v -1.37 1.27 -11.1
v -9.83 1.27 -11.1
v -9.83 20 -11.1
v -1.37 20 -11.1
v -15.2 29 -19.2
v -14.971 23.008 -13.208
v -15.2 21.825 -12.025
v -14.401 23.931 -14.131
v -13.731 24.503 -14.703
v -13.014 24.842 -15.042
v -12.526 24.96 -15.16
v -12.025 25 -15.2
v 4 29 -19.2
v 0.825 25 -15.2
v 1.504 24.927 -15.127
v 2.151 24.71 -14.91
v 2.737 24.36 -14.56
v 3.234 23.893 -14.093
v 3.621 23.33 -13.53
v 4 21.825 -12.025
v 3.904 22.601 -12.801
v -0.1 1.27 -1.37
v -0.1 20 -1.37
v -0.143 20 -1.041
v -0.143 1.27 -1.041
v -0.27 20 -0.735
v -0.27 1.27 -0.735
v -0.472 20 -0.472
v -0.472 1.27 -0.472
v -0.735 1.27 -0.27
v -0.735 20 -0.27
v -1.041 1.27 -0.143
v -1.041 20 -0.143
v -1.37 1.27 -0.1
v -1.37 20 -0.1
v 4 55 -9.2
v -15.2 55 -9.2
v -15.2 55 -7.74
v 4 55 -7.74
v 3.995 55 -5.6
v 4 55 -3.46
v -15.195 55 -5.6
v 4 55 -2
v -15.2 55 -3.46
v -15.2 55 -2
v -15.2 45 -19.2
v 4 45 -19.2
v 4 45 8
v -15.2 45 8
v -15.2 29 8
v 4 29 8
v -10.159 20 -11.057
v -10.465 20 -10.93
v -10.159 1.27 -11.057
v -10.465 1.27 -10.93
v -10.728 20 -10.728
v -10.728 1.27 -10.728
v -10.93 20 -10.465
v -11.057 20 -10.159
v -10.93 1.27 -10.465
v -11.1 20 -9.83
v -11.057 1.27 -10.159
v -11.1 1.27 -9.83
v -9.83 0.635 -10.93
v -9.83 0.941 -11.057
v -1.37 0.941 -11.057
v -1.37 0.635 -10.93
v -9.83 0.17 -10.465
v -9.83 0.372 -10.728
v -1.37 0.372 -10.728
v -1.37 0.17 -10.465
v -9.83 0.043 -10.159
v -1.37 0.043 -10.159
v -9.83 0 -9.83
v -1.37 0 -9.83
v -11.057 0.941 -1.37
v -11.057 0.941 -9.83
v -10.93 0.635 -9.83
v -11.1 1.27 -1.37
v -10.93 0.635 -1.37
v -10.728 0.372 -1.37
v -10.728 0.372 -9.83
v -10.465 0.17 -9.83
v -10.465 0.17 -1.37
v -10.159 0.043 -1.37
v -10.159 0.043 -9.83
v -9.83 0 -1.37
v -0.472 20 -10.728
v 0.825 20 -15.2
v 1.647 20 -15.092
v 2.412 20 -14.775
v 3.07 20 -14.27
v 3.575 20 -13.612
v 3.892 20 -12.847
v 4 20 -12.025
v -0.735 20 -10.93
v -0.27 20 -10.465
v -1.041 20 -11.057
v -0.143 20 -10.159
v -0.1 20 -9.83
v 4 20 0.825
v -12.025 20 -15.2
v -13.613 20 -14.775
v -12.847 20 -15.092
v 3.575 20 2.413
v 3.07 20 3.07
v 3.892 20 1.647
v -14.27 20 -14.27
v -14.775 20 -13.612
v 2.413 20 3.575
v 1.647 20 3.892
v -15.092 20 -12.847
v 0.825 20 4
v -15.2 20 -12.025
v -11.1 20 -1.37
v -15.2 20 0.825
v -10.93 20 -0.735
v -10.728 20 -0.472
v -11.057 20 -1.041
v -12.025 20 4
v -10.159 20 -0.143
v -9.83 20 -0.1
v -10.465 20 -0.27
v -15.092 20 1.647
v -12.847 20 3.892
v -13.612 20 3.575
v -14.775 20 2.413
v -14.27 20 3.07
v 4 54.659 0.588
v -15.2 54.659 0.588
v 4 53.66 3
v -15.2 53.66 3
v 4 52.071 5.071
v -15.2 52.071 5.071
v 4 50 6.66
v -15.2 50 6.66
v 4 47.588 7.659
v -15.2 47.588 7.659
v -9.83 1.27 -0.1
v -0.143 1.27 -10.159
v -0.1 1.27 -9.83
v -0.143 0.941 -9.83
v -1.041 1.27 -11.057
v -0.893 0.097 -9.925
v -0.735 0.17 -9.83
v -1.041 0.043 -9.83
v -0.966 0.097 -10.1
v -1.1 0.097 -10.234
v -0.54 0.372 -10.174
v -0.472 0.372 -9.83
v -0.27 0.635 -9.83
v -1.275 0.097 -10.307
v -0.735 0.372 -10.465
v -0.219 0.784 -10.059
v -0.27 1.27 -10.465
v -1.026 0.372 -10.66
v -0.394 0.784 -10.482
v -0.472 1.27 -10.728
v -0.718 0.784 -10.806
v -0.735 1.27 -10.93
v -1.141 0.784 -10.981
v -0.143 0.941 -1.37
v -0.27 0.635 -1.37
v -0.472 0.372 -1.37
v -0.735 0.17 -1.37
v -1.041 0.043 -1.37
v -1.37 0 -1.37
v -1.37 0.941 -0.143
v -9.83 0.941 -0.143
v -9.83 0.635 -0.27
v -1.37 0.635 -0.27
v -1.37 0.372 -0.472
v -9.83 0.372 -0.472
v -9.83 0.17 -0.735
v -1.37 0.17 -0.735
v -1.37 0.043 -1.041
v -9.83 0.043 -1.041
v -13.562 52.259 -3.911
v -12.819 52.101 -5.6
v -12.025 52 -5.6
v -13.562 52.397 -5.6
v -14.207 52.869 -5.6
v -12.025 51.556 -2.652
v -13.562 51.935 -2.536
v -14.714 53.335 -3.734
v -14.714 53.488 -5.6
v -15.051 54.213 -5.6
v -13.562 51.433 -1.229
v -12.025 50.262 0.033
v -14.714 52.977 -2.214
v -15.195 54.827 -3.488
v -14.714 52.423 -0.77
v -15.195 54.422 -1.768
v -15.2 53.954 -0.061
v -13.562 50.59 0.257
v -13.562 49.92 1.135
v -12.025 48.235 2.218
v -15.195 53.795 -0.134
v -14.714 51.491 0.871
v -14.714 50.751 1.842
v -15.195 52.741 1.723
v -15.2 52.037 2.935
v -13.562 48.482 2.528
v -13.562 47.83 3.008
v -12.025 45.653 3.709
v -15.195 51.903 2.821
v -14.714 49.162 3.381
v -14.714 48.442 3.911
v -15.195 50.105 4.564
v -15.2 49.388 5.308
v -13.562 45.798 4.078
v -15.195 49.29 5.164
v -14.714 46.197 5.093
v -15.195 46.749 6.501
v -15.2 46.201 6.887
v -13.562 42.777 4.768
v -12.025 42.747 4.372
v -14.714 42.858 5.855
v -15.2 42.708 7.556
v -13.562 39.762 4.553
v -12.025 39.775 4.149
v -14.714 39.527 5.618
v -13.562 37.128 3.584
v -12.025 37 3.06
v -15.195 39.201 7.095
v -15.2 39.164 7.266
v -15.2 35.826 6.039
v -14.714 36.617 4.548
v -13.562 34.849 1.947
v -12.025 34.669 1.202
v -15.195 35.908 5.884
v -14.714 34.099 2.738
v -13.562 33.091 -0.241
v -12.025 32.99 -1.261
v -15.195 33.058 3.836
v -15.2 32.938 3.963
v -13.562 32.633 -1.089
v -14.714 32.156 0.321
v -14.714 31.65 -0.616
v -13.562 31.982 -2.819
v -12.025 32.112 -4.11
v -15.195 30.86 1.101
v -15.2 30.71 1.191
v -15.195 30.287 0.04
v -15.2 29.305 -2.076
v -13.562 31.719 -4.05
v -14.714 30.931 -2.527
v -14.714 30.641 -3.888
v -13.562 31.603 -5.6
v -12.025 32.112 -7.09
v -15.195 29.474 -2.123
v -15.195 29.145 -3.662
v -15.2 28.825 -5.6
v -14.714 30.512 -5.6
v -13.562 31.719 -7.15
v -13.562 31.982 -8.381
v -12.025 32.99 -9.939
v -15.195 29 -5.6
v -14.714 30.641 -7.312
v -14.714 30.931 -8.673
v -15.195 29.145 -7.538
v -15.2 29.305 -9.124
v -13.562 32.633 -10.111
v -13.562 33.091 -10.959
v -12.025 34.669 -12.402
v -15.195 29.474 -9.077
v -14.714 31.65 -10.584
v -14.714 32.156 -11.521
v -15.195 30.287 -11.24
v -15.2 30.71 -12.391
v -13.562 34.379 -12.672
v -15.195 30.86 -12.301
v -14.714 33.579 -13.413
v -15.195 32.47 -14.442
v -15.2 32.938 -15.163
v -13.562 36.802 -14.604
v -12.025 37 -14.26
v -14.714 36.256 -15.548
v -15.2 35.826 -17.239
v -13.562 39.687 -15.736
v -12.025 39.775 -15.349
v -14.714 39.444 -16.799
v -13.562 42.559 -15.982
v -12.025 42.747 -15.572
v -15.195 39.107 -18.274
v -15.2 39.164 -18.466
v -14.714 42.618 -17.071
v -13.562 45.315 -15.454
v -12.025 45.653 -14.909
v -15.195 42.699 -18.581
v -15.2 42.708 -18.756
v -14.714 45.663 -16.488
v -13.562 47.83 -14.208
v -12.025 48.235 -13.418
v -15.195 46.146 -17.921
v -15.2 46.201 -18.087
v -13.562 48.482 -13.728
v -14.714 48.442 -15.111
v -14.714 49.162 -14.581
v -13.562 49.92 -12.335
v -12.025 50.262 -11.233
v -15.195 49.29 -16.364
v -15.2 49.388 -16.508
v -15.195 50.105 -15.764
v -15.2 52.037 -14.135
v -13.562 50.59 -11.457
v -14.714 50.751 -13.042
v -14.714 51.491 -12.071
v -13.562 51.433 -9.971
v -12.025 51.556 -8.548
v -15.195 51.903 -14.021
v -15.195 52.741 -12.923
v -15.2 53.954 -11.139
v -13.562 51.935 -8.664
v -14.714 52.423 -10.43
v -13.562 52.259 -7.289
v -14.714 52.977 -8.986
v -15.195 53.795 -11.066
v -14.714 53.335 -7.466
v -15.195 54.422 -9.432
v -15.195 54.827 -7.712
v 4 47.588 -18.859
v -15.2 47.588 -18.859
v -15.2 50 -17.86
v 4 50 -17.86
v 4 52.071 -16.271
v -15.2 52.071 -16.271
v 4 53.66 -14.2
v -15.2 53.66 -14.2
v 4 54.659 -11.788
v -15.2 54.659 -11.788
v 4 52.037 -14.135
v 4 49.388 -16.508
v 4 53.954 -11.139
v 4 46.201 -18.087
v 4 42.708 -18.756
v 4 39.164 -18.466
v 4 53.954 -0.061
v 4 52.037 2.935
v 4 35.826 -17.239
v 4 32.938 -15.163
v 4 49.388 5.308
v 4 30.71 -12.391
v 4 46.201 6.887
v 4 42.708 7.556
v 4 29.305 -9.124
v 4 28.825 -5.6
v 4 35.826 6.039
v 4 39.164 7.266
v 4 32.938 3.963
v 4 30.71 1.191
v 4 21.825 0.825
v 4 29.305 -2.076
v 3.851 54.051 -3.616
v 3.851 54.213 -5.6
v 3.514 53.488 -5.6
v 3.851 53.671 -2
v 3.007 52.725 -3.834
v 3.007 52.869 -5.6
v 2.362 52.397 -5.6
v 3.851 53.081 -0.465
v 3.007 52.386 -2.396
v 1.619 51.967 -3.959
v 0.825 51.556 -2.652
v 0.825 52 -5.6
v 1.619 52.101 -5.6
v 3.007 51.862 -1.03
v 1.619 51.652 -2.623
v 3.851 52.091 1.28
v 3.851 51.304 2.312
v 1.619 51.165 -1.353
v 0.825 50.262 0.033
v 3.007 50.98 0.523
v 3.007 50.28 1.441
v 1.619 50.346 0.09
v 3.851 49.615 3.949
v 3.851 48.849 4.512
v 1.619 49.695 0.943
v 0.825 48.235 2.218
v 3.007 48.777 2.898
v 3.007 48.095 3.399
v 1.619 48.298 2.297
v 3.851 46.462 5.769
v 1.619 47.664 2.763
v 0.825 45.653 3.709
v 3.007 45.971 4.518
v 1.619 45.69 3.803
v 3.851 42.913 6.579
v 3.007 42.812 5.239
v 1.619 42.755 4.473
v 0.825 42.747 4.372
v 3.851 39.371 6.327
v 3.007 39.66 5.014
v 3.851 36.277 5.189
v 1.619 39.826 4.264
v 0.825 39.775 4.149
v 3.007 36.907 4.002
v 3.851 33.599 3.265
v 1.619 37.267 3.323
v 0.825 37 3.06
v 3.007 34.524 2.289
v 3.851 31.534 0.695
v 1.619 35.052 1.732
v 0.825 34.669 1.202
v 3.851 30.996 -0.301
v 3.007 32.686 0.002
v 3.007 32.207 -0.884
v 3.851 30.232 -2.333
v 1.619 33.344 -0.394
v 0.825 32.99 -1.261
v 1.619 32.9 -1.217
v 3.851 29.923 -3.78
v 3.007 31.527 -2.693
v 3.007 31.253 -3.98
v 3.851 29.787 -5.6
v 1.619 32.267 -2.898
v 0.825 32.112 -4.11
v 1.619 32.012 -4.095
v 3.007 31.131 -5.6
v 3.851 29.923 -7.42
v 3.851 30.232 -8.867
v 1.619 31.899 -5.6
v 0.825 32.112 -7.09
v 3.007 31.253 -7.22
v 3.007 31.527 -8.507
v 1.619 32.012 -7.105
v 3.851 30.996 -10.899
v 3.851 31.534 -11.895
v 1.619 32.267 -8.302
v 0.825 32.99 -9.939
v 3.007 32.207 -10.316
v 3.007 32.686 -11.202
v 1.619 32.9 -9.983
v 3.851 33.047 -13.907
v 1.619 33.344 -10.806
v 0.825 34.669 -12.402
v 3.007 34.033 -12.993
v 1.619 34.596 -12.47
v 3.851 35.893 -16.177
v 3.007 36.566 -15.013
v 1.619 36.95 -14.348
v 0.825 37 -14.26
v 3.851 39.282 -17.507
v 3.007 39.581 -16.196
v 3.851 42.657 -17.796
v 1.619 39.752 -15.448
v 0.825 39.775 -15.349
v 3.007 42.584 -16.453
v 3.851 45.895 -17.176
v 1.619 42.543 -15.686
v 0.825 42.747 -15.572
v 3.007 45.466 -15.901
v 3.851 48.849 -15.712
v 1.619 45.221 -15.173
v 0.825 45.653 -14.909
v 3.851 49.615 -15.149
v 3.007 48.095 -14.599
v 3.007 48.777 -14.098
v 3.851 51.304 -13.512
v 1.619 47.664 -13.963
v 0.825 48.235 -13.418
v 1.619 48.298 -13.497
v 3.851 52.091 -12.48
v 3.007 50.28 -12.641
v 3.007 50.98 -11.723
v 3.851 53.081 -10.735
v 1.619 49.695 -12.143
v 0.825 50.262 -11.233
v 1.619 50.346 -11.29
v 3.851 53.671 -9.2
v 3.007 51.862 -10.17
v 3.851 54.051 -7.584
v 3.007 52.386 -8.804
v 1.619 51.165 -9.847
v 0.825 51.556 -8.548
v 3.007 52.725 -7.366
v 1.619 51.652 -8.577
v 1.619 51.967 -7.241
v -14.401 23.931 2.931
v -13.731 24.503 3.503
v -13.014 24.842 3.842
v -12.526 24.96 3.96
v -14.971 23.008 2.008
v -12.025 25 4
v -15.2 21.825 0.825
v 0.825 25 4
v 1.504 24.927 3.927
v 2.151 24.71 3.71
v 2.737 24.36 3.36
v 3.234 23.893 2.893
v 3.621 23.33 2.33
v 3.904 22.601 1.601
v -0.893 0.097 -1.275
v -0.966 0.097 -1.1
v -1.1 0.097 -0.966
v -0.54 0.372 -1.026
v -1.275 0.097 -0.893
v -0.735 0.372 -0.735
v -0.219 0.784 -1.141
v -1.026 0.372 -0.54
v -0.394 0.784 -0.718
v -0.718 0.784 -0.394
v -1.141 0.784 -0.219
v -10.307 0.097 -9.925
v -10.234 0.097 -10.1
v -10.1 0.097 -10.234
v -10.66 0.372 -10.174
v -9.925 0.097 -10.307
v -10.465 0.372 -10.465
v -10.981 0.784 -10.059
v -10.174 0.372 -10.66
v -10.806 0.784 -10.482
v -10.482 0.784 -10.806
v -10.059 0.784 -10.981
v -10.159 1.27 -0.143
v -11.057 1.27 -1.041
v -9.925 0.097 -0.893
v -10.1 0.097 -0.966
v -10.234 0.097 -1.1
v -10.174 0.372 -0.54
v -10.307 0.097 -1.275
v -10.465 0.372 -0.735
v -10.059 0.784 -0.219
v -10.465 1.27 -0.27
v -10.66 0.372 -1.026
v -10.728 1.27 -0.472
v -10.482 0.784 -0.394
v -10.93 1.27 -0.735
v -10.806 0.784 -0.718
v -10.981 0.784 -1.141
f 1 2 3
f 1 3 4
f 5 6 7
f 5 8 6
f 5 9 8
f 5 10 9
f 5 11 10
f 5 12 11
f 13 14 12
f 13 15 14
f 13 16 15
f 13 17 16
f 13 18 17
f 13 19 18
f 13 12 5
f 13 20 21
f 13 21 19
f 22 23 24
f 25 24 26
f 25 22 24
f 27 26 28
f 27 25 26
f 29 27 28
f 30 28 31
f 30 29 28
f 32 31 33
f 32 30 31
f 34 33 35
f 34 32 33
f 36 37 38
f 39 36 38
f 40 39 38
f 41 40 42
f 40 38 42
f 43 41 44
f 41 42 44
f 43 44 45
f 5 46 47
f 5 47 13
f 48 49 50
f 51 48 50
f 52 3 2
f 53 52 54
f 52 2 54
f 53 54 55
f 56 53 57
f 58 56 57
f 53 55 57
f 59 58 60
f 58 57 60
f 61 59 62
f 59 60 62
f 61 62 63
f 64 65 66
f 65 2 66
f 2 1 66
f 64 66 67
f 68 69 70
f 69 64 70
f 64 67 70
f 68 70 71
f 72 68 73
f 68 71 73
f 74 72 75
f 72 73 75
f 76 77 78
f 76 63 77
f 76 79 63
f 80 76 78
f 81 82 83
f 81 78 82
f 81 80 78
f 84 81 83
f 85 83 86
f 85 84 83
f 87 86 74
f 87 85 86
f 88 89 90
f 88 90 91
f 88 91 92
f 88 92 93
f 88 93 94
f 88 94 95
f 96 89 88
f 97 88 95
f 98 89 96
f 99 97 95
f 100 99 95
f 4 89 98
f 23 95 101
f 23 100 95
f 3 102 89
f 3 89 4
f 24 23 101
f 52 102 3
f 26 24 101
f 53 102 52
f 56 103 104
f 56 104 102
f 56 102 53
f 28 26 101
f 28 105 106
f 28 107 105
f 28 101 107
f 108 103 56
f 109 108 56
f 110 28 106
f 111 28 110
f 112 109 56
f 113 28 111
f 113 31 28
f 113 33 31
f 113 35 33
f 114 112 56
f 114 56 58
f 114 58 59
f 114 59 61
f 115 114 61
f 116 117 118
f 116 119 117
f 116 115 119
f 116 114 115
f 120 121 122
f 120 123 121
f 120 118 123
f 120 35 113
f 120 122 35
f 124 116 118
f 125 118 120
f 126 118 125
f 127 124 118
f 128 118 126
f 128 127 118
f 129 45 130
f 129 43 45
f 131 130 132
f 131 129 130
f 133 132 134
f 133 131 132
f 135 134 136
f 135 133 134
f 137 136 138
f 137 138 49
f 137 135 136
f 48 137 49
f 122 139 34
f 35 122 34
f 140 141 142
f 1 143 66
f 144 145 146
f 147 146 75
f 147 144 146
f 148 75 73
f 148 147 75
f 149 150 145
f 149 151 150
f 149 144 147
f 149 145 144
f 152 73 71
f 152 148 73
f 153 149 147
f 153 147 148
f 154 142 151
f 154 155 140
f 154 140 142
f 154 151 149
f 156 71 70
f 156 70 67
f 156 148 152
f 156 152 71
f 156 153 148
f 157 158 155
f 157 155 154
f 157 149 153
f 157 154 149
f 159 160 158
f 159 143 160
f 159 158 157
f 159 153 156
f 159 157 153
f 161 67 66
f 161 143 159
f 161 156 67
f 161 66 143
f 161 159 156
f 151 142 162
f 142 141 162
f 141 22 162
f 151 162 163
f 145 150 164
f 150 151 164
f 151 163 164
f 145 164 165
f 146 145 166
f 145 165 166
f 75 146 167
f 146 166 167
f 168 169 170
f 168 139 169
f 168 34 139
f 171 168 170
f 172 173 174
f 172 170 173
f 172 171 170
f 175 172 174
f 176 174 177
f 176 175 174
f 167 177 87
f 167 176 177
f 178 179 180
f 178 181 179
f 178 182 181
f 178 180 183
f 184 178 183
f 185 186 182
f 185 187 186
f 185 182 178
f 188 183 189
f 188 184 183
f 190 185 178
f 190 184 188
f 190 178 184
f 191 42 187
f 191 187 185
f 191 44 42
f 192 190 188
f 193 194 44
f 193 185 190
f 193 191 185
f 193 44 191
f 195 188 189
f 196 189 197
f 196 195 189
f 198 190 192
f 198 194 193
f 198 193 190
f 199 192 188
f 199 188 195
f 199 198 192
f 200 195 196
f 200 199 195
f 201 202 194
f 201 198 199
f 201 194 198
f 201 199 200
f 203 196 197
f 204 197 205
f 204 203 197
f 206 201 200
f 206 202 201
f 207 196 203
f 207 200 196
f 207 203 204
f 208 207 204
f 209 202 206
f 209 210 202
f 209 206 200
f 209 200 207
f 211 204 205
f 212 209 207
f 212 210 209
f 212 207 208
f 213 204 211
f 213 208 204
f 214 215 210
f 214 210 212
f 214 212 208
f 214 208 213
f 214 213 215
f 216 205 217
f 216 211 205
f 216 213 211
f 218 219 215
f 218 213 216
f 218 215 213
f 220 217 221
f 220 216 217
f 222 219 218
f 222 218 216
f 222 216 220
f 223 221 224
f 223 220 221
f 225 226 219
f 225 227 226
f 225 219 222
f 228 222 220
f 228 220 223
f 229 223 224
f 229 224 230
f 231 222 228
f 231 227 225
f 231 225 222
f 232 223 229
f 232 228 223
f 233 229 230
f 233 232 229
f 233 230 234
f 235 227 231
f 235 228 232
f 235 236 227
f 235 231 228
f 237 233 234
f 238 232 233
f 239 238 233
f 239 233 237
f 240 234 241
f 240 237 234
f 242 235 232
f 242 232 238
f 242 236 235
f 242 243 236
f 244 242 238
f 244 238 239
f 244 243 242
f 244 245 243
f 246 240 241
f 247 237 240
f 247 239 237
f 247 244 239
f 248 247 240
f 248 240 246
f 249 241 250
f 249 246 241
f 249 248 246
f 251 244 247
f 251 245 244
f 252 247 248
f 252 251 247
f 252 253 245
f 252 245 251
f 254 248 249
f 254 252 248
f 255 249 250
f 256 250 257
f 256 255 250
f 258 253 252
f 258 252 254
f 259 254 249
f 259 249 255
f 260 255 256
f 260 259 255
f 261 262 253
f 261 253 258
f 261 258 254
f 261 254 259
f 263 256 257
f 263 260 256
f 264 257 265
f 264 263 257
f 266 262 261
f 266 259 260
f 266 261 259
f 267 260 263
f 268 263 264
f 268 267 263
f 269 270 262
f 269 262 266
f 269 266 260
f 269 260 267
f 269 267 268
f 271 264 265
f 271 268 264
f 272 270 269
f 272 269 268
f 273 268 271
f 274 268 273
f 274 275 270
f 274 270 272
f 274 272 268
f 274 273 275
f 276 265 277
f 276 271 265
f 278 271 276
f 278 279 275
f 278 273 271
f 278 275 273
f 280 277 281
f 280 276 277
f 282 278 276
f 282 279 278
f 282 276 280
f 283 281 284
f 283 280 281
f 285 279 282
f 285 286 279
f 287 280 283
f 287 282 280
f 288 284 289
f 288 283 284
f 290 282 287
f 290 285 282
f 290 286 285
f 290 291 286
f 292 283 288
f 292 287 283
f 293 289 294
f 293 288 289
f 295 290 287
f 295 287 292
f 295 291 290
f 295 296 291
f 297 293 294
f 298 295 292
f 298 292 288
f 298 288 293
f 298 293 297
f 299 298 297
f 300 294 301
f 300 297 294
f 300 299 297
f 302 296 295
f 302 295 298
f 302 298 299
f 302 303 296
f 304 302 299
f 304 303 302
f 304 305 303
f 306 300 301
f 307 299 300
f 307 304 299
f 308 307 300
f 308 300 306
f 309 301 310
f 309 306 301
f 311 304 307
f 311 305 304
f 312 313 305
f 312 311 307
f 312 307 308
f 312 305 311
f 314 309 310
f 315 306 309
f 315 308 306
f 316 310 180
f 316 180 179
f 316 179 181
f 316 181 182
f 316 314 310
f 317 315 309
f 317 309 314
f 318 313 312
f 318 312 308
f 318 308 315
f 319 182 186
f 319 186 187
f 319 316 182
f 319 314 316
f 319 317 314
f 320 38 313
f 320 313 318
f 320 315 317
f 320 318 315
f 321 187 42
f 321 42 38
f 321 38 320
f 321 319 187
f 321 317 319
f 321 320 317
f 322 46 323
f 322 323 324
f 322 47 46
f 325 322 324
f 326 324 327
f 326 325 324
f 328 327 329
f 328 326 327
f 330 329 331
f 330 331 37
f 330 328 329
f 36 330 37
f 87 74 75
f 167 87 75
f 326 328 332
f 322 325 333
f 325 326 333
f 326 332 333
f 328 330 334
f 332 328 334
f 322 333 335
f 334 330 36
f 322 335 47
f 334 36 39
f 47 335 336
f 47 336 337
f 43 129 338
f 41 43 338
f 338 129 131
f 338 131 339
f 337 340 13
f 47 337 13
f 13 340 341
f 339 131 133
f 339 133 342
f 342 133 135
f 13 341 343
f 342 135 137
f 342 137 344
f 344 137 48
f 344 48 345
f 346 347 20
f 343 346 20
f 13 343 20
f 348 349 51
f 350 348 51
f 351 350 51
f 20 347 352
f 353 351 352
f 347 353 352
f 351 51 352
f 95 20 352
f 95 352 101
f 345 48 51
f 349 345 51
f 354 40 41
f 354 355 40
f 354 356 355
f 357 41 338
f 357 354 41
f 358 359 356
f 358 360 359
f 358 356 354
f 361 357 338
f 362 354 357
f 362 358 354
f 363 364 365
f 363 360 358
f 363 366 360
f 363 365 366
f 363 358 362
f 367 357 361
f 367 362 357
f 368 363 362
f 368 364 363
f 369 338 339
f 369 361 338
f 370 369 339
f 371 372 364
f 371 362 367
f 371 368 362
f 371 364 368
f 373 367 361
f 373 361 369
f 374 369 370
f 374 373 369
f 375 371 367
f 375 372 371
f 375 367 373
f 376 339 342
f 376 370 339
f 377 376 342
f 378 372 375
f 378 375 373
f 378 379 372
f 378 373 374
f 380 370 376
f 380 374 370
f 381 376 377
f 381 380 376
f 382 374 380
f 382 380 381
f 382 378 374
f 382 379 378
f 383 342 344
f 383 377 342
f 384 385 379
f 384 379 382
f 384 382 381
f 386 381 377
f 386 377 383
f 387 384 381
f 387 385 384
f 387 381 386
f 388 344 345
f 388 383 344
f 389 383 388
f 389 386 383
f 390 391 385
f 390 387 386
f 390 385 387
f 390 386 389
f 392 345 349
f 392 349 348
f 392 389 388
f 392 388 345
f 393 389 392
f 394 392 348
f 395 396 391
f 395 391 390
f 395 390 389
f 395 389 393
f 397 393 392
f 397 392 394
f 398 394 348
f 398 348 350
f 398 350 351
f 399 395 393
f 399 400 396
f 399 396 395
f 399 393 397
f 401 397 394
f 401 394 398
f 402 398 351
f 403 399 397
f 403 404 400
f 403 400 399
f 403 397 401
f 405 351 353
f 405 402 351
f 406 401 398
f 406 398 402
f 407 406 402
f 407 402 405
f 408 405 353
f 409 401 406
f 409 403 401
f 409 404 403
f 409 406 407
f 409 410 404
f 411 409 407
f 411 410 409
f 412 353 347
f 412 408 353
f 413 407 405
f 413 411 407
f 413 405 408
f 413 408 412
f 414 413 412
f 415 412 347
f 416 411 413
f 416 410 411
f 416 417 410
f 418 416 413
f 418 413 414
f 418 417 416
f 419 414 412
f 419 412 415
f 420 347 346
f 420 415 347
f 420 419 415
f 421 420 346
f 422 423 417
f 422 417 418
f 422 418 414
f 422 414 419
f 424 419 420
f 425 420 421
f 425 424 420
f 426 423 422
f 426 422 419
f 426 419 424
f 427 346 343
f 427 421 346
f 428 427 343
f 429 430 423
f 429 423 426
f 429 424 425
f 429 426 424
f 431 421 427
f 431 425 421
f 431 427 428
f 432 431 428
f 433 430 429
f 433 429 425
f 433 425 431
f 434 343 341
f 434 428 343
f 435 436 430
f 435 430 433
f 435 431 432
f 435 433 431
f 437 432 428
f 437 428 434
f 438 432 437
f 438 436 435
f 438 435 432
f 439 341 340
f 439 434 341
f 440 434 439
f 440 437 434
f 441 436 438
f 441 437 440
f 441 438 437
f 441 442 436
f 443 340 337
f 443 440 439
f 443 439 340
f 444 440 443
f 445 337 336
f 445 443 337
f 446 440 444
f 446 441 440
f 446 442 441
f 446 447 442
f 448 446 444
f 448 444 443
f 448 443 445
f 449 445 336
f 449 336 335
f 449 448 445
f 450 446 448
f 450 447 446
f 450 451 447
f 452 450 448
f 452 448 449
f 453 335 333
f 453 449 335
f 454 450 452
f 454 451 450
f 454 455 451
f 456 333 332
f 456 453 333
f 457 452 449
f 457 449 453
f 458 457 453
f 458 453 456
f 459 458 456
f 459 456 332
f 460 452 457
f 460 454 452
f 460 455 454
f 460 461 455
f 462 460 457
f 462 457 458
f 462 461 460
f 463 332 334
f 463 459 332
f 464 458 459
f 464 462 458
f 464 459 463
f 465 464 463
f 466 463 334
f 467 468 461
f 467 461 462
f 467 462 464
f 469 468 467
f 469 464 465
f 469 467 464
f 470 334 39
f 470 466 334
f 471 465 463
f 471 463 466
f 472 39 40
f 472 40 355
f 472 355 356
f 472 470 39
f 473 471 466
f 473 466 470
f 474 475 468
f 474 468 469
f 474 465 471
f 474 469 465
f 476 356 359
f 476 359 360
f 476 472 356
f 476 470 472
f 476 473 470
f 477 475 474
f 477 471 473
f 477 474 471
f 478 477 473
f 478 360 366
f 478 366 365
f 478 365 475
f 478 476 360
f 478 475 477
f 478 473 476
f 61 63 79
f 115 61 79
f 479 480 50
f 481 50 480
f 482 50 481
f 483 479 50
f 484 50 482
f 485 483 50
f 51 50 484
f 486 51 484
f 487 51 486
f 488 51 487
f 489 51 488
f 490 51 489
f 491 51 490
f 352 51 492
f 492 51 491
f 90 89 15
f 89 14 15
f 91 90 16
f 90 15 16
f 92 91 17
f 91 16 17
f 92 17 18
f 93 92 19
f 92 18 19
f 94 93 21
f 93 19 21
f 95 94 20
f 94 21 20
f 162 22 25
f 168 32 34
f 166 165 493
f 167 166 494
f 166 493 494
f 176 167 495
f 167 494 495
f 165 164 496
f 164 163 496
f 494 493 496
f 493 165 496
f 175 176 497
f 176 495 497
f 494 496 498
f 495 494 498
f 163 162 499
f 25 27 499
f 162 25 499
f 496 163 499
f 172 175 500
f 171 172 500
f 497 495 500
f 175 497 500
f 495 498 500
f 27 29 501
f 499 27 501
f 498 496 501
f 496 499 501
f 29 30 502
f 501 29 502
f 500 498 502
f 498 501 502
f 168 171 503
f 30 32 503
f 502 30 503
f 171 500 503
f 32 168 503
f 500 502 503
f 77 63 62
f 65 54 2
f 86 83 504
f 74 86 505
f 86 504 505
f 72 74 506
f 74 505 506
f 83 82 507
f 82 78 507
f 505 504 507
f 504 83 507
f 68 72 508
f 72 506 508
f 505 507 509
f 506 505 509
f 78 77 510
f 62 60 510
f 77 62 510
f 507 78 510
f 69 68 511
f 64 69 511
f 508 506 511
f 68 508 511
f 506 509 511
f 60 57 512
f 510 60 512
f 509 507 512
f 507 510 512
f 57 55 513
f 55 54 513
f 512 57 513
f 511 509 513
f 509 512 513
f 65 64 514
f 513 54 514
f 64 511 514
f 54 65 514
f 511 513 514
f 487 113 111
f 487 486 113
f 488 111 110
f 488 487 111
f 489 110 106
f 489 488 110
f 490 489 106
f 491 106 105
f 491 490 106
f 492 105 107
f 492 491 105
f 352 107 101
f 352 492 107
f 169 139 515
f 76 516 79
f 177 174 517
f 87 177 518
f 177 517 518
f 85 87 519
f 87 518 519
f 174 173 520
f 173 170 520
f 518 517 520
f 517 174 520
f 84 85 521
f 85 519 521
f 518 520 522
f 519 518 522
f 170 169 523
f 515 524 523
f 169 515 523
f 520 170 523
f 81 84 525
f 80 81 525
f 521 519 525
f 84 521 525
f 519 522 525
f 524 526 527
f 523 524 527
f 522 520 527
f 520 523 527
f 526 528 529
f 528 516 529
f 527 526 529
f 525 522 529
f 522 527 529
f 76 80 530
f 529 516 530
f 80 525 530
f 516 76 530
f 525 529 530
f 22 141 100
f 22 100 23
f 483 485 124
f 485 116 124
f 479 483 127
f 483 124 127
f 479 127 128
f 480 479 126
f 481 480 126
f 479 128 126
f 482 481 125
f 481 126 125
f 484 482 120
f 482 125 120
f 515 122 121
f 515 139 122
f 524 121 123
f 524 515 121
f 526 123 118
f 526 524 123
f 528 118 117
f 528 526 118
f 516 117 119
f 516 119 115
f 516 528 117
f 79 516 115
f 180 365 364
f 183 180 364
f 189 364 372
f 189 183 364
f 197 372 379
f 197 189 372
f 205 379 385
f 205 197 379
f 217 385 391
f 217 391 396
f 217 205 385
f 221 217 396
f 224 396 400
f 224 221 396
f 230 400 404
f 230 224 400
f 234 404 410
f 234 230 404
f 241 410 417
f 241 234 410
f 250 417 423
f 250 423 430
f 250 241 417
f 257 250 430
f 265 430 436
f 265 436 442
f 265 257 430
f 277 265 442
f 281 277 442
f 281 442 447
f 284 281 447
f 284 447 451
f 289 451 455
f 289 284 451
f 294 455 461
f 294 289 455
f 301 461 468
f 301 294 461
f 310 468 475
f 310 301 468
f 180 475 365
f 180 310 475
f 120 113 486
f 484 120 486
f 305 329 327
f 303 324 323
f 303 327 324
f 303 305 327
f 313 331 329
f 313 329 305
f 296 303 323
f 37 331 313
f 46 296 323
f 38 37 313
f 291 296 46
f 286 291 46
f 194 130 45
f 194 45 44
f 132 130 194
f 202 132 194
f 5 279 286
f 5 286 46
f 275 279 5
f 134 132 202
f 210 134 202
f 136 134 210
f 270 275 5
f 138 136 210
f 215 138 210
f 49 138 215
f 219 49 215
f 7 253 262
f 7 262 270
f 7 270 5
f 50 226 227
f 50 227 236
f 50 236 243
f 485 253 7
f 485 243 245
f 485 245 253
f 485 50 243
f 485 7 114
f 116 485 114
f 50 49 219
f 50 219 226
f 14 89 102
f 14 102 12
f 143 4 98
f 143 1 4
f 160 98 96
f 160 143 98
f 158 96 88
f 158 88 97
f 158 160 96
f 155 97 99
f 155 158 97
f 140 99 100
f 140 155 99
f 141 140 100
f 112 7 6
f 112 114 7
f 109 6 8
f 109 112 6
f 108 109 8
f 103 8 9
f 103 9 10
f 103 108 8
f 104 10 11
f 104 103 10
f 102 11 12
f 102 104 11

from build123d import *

# Parameters (mm, degrees)
SKETCH1_W           = 35
SKETCH1_H           = 27.2
BOSS_EXTRUDE1_DEPTH = 19.2
SKETCH2_W           = 4
SKETCH2_H           = 5
CUT_EXTRUDE1_DEPTH  = 20.2
SKETCH3_W           = 4
SKETCH3_H           = 5
CUT_EXTRUDE2_DEPTH  = 20.2
SKETCH4_W           = 11
SKETCH4_H           = 11
BOSS_EXTRUDE2_DEPTH = 20
DRAFT1_ANGLE        = 45
DRAFT2_ANGLE        = 45
FILLET1_R           = 1.27
FILLET2_R           = 3.175
FILLET3_R           = 10


with BuildPart() as part:
    # Sketch1 → Boss-Extrude1 (new body)
    with BuildSketch(Plane(origin=(-15.2, 0, 0), x_dir=(0, -1, 0), z_dir=(-1, 0, 0))):
        with Locations((-37.5, -5.6)):
            Rectangle(SKETCH1_W, SKETCH1_H)
    extrude(amount=-BOSS_EXTRUDE1_DEPTH)

    # Sketch2 → Cut-Extrude1 (cut, through all)
    with BuildSketch(Plane(origin=(4, 0, 0), x_dir=(0, 0, -1), z_dir=(1, 0, 0))):
        with Locations((-6, 22.5)):
            Rectangle(SKETCH2_W, SKETCH2_H)
    extrude(amount=-CUT_EXTRUDE1_DEPTH, mode=Mode.SUBTRACT)

    # Sketch3 → Cut-Extrude2 (cut, through all)
    with BuildSketch(Plane(origin=(4, 0, 0), x_dir=(0, 0, -1), z_dir=(1, 0, 0))):
        with Locations((17.2, 22.5)):
            Rectangle(SKETCH3_W, SKETCH3_H)
    extrude(amount=-CUT_EXTRUDE2_DEPTH, mode=Mode.SUBTRACT)

    # Sketch4 → Boss-Extrude2 (add)
    with BuildSketch(Plane.XZ.offset(-20)):
        with Locations((-5.6, -5.6)):
            Rectangle(SKETCH4_W, SKETCH4_H)
    extrude(amount=BOSS_EXTRUDE2_DEPTH)

    # Draft1
    draft1_faces = [part.faces().sort_by_distance(p)[0] for p in [
        (-5.6, 25, 6),
    ]]
    draft(draft1_faces, Plane(origin=(-15.2, 20, 4), x_dir=(1, 0, 0), z_dir=(0, 0, 1)), DRAFT1_ANGLE)

    # Draft2
    draft2_faces = [part.faces().sort_by_distance(p)[0] for p in [
        (-5.6, 25, -17.2),
    ]]
    draft(draft2_faces, Plane(origin=(-15.2, 25, -15.2), x_dir=(0, -1, 0), z_dir=(0, 0, -1)), DRAFT2_ANGLE)

    # Sketch5 → Cut-Revolve1 (revolve, cut)
    with BuildSketch(Plane.XY.offset(-5.6)):
        with BuildLine():
            Line((-15.2, 55.175), (-15.2, 42))
            Line((-15.2, 42), (4, 42))
            Line((4, 42), (4, 55.175))
            ThreePointArc((4, 55.175), (3.07006403, 52.92993597), (0.825, 52))
            Line((0.825, 52), (-12.025, 52))
            ThreePointArc((-12.025, 52), (-14.27006403, 52.92993597), (-15.2, 55.175))
        make_face()
    revolve(axis=Axis((-15.2, 42, -5.6), (1, 0, 0)), mode=Mode.SUBTRACT)

    # Fillet1
    fillet1_edges = [part.edges().sort_by_distance(p)[0] for p in [
        (-0.1, 10, -11.1),
        (-0.1, 10, -0.1),
        (-11.1, 10, -0.1),
        (-11.1, 10, -11.1),
        (-0.1, 0, -5.6),
        (-5.6, 0, -0.1),
        (-11.1, 0, -5.6),
        (-5.6, 0, -11.1),
    ]]
    fillet(fillet1_edges, radius=FILLET1_R)

    # Fillet2
    fillet2_edges = [part.edges().sort_by_distance(p)[0] for p in [
        (-15.2, 22.5, 4),
        (4, 22.5, 4),
        (-15.2, 22.5, -15.2),
        (4, 22.5, -15.2),
    ]]
    fillet(fillet2_edges, radius=FILLET2_R)

    # Fillet3
    fillet3_edges = [part.edges().sort_by_distance(p)[0] for p in [
        (-5.6, 55, 8),
        (-5.6, 55, -19.2),
    ]]
    fillet(fillet3_edges, radius=FILLET3_R)


solid = part.part
